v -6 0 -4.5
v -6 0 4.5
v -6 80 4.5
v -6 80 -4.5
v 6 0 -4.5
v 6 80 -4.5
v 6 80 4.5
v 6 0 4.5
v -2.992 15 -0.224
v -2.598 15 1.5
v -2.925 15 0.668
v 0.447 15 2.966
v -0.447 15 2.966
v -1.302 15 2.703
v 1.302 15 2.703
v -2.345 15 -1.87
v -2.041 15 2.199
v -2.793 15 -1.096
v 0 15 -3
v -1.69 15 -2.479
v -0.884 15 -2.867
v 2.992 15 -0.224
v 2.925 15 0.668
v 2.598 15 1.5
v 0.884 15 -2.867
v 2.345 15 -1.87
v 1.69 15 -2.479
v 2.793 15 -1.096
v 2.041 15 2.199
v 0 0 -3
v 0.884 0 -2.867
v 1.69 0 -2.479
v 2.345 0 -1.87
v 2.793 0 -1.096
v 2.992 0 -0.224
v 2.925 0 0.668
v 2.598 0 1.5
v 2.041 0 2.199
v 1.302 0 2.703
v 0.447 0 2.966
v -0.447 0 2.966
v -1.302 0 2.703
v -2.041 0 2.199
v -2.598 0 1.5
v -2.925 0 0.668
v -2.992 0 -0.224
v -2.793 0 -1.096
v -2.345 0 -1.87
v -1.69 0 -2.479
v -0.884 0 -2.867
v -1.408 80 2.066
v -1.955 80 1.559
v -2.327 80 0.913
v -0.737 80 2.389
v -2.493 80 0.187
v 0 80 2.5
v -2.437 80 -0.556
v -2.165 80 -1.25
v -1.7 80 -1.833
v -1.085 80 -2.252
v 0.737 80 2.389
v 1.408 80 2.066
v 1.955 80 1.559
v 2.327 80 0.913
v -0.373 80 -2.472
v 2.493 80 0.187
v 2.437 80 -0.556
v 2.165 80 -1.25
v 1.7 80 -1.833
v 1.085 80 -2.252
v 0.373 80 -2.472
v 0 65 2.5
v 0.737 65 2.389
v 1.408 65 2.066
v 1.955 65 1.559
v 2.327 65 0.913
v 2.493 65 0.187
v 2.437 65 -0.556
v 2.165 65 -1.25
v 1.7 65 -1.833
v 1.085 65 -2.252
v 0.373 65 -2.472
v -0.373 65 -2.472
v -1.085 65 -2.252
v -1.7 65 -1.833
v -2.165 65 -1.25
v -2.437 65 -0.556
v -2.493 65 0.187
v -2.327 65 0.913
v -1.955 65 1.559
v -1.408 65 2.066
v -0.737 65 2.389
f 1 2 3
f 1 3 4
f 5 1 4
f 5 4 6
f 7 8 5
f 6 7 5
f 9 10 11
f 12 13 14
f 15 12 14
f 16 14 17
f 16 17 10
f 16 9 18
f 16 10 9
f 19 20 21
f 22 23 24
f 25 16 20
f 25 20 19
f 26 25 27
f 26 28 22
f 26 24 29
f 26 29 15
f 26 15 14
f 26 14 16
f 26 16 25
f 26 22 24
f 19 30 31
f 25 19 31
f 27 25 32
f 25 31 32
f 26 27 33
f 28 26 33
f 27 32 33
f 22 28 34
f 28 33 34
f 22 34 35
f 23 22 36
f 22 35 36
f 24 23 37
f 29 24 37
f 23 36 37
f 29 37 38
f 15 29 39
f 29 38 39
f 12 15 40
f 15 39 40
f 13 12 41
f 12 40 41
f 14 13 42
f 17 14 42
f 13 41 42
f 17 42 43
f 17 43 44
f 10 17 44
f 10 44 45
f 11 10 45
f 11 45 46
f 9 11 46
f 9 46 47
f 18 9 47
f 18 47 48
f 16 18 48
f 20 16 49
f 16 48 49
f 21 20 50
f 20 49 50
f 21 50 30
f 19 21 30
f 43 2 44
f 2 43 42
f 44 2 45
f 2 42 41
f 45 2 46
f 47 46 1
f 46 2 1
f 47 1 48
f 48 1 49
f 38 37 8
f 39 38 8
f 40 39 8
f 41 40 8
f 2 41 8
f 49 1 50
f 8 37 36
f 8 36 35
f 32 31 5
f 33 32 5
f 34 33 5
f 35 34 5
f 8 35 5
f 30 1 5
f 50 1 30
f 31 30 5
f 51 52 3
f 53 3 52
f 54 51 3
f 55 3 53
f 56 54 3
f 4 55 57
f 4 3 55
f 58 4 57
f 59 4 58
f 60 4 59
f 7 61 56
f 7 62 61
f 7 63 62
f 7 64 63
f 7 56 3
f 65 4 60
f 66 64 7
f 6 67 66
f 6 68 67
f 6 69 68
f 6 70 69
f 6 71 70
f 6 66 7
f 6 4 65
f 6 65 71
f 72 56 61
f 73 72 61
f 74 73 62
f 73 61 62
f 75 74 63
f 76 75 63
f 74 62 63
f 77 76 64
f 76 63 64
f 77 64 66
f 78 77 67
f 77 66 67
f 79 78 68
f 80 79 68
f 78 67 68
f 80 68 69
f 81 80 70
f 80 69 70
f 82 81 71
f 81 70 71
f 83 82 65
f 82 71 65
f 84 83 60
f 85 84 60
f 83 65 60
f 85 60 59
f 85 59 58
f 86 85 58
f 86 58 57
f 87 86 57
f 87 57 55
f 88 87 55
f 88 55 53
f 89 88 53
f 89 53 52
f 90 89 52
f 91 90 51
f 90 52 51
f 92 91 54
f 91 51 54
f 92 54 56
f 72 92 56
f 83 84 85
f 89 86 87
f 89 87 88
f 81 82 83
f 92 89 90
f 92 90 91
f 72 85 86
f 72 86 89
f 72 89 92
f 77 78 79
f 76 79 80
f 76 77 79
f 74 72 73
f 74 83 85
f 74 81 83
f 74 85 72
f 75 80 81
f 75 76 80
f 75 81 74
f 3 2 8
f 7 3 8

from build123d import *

# Parameters (mm, degrees)
SKETCH_2_W          = 12
SKETCH_2_H          = 9
EXTRUDE_1_DEPTH     = 80
SKETCH_3_R          = 3
CUT_EXTRUDE_1_DEPTH = 15
SKETCH_4_R          = 2.5
CUT_EXTRUDE_2_DEPTH = 15


with BuildPart() as part:
    # 草图2 → 凸台-拉伸1 (new body)
    with BuildSketch(Plane(origin=(0, 0, 0), x_dir=(1, 0, 0), z_dir=(0, 1, 0))):
        Rectangle(SKETCH_2_W, SKETCH_2_H)
    extrude(amount=EXTRUDE_1_DEPTH)

    # 草图3 → 切除-拉伸1 (cut)
    with BuildSketch(Plane.XZ):
        with Locations(Location((0, 0, 0), (0, 0, 270))):
            Circle(SKETCH_3_R)
    extrude(amount=-CUT_EXTRUDE_1_DEPTH, mode=Mode.SUBTRACT)

    # 草图4 → 切除-拉伸2 (cut)
    with BuildSketch(Plane(origin=(0, 80, 0), x_dir=(1, 0, 0), z_dir=(0, 1, 0))):
        with Locations(Location((0, 0, 0), (0, 0, 270))):
            Circle(SKETCH_4_R)
    extrude(amount=-CUT_EXTRUDE_2_DEPTH, mode=Mode.SUBTRACT)


solid = part.part
